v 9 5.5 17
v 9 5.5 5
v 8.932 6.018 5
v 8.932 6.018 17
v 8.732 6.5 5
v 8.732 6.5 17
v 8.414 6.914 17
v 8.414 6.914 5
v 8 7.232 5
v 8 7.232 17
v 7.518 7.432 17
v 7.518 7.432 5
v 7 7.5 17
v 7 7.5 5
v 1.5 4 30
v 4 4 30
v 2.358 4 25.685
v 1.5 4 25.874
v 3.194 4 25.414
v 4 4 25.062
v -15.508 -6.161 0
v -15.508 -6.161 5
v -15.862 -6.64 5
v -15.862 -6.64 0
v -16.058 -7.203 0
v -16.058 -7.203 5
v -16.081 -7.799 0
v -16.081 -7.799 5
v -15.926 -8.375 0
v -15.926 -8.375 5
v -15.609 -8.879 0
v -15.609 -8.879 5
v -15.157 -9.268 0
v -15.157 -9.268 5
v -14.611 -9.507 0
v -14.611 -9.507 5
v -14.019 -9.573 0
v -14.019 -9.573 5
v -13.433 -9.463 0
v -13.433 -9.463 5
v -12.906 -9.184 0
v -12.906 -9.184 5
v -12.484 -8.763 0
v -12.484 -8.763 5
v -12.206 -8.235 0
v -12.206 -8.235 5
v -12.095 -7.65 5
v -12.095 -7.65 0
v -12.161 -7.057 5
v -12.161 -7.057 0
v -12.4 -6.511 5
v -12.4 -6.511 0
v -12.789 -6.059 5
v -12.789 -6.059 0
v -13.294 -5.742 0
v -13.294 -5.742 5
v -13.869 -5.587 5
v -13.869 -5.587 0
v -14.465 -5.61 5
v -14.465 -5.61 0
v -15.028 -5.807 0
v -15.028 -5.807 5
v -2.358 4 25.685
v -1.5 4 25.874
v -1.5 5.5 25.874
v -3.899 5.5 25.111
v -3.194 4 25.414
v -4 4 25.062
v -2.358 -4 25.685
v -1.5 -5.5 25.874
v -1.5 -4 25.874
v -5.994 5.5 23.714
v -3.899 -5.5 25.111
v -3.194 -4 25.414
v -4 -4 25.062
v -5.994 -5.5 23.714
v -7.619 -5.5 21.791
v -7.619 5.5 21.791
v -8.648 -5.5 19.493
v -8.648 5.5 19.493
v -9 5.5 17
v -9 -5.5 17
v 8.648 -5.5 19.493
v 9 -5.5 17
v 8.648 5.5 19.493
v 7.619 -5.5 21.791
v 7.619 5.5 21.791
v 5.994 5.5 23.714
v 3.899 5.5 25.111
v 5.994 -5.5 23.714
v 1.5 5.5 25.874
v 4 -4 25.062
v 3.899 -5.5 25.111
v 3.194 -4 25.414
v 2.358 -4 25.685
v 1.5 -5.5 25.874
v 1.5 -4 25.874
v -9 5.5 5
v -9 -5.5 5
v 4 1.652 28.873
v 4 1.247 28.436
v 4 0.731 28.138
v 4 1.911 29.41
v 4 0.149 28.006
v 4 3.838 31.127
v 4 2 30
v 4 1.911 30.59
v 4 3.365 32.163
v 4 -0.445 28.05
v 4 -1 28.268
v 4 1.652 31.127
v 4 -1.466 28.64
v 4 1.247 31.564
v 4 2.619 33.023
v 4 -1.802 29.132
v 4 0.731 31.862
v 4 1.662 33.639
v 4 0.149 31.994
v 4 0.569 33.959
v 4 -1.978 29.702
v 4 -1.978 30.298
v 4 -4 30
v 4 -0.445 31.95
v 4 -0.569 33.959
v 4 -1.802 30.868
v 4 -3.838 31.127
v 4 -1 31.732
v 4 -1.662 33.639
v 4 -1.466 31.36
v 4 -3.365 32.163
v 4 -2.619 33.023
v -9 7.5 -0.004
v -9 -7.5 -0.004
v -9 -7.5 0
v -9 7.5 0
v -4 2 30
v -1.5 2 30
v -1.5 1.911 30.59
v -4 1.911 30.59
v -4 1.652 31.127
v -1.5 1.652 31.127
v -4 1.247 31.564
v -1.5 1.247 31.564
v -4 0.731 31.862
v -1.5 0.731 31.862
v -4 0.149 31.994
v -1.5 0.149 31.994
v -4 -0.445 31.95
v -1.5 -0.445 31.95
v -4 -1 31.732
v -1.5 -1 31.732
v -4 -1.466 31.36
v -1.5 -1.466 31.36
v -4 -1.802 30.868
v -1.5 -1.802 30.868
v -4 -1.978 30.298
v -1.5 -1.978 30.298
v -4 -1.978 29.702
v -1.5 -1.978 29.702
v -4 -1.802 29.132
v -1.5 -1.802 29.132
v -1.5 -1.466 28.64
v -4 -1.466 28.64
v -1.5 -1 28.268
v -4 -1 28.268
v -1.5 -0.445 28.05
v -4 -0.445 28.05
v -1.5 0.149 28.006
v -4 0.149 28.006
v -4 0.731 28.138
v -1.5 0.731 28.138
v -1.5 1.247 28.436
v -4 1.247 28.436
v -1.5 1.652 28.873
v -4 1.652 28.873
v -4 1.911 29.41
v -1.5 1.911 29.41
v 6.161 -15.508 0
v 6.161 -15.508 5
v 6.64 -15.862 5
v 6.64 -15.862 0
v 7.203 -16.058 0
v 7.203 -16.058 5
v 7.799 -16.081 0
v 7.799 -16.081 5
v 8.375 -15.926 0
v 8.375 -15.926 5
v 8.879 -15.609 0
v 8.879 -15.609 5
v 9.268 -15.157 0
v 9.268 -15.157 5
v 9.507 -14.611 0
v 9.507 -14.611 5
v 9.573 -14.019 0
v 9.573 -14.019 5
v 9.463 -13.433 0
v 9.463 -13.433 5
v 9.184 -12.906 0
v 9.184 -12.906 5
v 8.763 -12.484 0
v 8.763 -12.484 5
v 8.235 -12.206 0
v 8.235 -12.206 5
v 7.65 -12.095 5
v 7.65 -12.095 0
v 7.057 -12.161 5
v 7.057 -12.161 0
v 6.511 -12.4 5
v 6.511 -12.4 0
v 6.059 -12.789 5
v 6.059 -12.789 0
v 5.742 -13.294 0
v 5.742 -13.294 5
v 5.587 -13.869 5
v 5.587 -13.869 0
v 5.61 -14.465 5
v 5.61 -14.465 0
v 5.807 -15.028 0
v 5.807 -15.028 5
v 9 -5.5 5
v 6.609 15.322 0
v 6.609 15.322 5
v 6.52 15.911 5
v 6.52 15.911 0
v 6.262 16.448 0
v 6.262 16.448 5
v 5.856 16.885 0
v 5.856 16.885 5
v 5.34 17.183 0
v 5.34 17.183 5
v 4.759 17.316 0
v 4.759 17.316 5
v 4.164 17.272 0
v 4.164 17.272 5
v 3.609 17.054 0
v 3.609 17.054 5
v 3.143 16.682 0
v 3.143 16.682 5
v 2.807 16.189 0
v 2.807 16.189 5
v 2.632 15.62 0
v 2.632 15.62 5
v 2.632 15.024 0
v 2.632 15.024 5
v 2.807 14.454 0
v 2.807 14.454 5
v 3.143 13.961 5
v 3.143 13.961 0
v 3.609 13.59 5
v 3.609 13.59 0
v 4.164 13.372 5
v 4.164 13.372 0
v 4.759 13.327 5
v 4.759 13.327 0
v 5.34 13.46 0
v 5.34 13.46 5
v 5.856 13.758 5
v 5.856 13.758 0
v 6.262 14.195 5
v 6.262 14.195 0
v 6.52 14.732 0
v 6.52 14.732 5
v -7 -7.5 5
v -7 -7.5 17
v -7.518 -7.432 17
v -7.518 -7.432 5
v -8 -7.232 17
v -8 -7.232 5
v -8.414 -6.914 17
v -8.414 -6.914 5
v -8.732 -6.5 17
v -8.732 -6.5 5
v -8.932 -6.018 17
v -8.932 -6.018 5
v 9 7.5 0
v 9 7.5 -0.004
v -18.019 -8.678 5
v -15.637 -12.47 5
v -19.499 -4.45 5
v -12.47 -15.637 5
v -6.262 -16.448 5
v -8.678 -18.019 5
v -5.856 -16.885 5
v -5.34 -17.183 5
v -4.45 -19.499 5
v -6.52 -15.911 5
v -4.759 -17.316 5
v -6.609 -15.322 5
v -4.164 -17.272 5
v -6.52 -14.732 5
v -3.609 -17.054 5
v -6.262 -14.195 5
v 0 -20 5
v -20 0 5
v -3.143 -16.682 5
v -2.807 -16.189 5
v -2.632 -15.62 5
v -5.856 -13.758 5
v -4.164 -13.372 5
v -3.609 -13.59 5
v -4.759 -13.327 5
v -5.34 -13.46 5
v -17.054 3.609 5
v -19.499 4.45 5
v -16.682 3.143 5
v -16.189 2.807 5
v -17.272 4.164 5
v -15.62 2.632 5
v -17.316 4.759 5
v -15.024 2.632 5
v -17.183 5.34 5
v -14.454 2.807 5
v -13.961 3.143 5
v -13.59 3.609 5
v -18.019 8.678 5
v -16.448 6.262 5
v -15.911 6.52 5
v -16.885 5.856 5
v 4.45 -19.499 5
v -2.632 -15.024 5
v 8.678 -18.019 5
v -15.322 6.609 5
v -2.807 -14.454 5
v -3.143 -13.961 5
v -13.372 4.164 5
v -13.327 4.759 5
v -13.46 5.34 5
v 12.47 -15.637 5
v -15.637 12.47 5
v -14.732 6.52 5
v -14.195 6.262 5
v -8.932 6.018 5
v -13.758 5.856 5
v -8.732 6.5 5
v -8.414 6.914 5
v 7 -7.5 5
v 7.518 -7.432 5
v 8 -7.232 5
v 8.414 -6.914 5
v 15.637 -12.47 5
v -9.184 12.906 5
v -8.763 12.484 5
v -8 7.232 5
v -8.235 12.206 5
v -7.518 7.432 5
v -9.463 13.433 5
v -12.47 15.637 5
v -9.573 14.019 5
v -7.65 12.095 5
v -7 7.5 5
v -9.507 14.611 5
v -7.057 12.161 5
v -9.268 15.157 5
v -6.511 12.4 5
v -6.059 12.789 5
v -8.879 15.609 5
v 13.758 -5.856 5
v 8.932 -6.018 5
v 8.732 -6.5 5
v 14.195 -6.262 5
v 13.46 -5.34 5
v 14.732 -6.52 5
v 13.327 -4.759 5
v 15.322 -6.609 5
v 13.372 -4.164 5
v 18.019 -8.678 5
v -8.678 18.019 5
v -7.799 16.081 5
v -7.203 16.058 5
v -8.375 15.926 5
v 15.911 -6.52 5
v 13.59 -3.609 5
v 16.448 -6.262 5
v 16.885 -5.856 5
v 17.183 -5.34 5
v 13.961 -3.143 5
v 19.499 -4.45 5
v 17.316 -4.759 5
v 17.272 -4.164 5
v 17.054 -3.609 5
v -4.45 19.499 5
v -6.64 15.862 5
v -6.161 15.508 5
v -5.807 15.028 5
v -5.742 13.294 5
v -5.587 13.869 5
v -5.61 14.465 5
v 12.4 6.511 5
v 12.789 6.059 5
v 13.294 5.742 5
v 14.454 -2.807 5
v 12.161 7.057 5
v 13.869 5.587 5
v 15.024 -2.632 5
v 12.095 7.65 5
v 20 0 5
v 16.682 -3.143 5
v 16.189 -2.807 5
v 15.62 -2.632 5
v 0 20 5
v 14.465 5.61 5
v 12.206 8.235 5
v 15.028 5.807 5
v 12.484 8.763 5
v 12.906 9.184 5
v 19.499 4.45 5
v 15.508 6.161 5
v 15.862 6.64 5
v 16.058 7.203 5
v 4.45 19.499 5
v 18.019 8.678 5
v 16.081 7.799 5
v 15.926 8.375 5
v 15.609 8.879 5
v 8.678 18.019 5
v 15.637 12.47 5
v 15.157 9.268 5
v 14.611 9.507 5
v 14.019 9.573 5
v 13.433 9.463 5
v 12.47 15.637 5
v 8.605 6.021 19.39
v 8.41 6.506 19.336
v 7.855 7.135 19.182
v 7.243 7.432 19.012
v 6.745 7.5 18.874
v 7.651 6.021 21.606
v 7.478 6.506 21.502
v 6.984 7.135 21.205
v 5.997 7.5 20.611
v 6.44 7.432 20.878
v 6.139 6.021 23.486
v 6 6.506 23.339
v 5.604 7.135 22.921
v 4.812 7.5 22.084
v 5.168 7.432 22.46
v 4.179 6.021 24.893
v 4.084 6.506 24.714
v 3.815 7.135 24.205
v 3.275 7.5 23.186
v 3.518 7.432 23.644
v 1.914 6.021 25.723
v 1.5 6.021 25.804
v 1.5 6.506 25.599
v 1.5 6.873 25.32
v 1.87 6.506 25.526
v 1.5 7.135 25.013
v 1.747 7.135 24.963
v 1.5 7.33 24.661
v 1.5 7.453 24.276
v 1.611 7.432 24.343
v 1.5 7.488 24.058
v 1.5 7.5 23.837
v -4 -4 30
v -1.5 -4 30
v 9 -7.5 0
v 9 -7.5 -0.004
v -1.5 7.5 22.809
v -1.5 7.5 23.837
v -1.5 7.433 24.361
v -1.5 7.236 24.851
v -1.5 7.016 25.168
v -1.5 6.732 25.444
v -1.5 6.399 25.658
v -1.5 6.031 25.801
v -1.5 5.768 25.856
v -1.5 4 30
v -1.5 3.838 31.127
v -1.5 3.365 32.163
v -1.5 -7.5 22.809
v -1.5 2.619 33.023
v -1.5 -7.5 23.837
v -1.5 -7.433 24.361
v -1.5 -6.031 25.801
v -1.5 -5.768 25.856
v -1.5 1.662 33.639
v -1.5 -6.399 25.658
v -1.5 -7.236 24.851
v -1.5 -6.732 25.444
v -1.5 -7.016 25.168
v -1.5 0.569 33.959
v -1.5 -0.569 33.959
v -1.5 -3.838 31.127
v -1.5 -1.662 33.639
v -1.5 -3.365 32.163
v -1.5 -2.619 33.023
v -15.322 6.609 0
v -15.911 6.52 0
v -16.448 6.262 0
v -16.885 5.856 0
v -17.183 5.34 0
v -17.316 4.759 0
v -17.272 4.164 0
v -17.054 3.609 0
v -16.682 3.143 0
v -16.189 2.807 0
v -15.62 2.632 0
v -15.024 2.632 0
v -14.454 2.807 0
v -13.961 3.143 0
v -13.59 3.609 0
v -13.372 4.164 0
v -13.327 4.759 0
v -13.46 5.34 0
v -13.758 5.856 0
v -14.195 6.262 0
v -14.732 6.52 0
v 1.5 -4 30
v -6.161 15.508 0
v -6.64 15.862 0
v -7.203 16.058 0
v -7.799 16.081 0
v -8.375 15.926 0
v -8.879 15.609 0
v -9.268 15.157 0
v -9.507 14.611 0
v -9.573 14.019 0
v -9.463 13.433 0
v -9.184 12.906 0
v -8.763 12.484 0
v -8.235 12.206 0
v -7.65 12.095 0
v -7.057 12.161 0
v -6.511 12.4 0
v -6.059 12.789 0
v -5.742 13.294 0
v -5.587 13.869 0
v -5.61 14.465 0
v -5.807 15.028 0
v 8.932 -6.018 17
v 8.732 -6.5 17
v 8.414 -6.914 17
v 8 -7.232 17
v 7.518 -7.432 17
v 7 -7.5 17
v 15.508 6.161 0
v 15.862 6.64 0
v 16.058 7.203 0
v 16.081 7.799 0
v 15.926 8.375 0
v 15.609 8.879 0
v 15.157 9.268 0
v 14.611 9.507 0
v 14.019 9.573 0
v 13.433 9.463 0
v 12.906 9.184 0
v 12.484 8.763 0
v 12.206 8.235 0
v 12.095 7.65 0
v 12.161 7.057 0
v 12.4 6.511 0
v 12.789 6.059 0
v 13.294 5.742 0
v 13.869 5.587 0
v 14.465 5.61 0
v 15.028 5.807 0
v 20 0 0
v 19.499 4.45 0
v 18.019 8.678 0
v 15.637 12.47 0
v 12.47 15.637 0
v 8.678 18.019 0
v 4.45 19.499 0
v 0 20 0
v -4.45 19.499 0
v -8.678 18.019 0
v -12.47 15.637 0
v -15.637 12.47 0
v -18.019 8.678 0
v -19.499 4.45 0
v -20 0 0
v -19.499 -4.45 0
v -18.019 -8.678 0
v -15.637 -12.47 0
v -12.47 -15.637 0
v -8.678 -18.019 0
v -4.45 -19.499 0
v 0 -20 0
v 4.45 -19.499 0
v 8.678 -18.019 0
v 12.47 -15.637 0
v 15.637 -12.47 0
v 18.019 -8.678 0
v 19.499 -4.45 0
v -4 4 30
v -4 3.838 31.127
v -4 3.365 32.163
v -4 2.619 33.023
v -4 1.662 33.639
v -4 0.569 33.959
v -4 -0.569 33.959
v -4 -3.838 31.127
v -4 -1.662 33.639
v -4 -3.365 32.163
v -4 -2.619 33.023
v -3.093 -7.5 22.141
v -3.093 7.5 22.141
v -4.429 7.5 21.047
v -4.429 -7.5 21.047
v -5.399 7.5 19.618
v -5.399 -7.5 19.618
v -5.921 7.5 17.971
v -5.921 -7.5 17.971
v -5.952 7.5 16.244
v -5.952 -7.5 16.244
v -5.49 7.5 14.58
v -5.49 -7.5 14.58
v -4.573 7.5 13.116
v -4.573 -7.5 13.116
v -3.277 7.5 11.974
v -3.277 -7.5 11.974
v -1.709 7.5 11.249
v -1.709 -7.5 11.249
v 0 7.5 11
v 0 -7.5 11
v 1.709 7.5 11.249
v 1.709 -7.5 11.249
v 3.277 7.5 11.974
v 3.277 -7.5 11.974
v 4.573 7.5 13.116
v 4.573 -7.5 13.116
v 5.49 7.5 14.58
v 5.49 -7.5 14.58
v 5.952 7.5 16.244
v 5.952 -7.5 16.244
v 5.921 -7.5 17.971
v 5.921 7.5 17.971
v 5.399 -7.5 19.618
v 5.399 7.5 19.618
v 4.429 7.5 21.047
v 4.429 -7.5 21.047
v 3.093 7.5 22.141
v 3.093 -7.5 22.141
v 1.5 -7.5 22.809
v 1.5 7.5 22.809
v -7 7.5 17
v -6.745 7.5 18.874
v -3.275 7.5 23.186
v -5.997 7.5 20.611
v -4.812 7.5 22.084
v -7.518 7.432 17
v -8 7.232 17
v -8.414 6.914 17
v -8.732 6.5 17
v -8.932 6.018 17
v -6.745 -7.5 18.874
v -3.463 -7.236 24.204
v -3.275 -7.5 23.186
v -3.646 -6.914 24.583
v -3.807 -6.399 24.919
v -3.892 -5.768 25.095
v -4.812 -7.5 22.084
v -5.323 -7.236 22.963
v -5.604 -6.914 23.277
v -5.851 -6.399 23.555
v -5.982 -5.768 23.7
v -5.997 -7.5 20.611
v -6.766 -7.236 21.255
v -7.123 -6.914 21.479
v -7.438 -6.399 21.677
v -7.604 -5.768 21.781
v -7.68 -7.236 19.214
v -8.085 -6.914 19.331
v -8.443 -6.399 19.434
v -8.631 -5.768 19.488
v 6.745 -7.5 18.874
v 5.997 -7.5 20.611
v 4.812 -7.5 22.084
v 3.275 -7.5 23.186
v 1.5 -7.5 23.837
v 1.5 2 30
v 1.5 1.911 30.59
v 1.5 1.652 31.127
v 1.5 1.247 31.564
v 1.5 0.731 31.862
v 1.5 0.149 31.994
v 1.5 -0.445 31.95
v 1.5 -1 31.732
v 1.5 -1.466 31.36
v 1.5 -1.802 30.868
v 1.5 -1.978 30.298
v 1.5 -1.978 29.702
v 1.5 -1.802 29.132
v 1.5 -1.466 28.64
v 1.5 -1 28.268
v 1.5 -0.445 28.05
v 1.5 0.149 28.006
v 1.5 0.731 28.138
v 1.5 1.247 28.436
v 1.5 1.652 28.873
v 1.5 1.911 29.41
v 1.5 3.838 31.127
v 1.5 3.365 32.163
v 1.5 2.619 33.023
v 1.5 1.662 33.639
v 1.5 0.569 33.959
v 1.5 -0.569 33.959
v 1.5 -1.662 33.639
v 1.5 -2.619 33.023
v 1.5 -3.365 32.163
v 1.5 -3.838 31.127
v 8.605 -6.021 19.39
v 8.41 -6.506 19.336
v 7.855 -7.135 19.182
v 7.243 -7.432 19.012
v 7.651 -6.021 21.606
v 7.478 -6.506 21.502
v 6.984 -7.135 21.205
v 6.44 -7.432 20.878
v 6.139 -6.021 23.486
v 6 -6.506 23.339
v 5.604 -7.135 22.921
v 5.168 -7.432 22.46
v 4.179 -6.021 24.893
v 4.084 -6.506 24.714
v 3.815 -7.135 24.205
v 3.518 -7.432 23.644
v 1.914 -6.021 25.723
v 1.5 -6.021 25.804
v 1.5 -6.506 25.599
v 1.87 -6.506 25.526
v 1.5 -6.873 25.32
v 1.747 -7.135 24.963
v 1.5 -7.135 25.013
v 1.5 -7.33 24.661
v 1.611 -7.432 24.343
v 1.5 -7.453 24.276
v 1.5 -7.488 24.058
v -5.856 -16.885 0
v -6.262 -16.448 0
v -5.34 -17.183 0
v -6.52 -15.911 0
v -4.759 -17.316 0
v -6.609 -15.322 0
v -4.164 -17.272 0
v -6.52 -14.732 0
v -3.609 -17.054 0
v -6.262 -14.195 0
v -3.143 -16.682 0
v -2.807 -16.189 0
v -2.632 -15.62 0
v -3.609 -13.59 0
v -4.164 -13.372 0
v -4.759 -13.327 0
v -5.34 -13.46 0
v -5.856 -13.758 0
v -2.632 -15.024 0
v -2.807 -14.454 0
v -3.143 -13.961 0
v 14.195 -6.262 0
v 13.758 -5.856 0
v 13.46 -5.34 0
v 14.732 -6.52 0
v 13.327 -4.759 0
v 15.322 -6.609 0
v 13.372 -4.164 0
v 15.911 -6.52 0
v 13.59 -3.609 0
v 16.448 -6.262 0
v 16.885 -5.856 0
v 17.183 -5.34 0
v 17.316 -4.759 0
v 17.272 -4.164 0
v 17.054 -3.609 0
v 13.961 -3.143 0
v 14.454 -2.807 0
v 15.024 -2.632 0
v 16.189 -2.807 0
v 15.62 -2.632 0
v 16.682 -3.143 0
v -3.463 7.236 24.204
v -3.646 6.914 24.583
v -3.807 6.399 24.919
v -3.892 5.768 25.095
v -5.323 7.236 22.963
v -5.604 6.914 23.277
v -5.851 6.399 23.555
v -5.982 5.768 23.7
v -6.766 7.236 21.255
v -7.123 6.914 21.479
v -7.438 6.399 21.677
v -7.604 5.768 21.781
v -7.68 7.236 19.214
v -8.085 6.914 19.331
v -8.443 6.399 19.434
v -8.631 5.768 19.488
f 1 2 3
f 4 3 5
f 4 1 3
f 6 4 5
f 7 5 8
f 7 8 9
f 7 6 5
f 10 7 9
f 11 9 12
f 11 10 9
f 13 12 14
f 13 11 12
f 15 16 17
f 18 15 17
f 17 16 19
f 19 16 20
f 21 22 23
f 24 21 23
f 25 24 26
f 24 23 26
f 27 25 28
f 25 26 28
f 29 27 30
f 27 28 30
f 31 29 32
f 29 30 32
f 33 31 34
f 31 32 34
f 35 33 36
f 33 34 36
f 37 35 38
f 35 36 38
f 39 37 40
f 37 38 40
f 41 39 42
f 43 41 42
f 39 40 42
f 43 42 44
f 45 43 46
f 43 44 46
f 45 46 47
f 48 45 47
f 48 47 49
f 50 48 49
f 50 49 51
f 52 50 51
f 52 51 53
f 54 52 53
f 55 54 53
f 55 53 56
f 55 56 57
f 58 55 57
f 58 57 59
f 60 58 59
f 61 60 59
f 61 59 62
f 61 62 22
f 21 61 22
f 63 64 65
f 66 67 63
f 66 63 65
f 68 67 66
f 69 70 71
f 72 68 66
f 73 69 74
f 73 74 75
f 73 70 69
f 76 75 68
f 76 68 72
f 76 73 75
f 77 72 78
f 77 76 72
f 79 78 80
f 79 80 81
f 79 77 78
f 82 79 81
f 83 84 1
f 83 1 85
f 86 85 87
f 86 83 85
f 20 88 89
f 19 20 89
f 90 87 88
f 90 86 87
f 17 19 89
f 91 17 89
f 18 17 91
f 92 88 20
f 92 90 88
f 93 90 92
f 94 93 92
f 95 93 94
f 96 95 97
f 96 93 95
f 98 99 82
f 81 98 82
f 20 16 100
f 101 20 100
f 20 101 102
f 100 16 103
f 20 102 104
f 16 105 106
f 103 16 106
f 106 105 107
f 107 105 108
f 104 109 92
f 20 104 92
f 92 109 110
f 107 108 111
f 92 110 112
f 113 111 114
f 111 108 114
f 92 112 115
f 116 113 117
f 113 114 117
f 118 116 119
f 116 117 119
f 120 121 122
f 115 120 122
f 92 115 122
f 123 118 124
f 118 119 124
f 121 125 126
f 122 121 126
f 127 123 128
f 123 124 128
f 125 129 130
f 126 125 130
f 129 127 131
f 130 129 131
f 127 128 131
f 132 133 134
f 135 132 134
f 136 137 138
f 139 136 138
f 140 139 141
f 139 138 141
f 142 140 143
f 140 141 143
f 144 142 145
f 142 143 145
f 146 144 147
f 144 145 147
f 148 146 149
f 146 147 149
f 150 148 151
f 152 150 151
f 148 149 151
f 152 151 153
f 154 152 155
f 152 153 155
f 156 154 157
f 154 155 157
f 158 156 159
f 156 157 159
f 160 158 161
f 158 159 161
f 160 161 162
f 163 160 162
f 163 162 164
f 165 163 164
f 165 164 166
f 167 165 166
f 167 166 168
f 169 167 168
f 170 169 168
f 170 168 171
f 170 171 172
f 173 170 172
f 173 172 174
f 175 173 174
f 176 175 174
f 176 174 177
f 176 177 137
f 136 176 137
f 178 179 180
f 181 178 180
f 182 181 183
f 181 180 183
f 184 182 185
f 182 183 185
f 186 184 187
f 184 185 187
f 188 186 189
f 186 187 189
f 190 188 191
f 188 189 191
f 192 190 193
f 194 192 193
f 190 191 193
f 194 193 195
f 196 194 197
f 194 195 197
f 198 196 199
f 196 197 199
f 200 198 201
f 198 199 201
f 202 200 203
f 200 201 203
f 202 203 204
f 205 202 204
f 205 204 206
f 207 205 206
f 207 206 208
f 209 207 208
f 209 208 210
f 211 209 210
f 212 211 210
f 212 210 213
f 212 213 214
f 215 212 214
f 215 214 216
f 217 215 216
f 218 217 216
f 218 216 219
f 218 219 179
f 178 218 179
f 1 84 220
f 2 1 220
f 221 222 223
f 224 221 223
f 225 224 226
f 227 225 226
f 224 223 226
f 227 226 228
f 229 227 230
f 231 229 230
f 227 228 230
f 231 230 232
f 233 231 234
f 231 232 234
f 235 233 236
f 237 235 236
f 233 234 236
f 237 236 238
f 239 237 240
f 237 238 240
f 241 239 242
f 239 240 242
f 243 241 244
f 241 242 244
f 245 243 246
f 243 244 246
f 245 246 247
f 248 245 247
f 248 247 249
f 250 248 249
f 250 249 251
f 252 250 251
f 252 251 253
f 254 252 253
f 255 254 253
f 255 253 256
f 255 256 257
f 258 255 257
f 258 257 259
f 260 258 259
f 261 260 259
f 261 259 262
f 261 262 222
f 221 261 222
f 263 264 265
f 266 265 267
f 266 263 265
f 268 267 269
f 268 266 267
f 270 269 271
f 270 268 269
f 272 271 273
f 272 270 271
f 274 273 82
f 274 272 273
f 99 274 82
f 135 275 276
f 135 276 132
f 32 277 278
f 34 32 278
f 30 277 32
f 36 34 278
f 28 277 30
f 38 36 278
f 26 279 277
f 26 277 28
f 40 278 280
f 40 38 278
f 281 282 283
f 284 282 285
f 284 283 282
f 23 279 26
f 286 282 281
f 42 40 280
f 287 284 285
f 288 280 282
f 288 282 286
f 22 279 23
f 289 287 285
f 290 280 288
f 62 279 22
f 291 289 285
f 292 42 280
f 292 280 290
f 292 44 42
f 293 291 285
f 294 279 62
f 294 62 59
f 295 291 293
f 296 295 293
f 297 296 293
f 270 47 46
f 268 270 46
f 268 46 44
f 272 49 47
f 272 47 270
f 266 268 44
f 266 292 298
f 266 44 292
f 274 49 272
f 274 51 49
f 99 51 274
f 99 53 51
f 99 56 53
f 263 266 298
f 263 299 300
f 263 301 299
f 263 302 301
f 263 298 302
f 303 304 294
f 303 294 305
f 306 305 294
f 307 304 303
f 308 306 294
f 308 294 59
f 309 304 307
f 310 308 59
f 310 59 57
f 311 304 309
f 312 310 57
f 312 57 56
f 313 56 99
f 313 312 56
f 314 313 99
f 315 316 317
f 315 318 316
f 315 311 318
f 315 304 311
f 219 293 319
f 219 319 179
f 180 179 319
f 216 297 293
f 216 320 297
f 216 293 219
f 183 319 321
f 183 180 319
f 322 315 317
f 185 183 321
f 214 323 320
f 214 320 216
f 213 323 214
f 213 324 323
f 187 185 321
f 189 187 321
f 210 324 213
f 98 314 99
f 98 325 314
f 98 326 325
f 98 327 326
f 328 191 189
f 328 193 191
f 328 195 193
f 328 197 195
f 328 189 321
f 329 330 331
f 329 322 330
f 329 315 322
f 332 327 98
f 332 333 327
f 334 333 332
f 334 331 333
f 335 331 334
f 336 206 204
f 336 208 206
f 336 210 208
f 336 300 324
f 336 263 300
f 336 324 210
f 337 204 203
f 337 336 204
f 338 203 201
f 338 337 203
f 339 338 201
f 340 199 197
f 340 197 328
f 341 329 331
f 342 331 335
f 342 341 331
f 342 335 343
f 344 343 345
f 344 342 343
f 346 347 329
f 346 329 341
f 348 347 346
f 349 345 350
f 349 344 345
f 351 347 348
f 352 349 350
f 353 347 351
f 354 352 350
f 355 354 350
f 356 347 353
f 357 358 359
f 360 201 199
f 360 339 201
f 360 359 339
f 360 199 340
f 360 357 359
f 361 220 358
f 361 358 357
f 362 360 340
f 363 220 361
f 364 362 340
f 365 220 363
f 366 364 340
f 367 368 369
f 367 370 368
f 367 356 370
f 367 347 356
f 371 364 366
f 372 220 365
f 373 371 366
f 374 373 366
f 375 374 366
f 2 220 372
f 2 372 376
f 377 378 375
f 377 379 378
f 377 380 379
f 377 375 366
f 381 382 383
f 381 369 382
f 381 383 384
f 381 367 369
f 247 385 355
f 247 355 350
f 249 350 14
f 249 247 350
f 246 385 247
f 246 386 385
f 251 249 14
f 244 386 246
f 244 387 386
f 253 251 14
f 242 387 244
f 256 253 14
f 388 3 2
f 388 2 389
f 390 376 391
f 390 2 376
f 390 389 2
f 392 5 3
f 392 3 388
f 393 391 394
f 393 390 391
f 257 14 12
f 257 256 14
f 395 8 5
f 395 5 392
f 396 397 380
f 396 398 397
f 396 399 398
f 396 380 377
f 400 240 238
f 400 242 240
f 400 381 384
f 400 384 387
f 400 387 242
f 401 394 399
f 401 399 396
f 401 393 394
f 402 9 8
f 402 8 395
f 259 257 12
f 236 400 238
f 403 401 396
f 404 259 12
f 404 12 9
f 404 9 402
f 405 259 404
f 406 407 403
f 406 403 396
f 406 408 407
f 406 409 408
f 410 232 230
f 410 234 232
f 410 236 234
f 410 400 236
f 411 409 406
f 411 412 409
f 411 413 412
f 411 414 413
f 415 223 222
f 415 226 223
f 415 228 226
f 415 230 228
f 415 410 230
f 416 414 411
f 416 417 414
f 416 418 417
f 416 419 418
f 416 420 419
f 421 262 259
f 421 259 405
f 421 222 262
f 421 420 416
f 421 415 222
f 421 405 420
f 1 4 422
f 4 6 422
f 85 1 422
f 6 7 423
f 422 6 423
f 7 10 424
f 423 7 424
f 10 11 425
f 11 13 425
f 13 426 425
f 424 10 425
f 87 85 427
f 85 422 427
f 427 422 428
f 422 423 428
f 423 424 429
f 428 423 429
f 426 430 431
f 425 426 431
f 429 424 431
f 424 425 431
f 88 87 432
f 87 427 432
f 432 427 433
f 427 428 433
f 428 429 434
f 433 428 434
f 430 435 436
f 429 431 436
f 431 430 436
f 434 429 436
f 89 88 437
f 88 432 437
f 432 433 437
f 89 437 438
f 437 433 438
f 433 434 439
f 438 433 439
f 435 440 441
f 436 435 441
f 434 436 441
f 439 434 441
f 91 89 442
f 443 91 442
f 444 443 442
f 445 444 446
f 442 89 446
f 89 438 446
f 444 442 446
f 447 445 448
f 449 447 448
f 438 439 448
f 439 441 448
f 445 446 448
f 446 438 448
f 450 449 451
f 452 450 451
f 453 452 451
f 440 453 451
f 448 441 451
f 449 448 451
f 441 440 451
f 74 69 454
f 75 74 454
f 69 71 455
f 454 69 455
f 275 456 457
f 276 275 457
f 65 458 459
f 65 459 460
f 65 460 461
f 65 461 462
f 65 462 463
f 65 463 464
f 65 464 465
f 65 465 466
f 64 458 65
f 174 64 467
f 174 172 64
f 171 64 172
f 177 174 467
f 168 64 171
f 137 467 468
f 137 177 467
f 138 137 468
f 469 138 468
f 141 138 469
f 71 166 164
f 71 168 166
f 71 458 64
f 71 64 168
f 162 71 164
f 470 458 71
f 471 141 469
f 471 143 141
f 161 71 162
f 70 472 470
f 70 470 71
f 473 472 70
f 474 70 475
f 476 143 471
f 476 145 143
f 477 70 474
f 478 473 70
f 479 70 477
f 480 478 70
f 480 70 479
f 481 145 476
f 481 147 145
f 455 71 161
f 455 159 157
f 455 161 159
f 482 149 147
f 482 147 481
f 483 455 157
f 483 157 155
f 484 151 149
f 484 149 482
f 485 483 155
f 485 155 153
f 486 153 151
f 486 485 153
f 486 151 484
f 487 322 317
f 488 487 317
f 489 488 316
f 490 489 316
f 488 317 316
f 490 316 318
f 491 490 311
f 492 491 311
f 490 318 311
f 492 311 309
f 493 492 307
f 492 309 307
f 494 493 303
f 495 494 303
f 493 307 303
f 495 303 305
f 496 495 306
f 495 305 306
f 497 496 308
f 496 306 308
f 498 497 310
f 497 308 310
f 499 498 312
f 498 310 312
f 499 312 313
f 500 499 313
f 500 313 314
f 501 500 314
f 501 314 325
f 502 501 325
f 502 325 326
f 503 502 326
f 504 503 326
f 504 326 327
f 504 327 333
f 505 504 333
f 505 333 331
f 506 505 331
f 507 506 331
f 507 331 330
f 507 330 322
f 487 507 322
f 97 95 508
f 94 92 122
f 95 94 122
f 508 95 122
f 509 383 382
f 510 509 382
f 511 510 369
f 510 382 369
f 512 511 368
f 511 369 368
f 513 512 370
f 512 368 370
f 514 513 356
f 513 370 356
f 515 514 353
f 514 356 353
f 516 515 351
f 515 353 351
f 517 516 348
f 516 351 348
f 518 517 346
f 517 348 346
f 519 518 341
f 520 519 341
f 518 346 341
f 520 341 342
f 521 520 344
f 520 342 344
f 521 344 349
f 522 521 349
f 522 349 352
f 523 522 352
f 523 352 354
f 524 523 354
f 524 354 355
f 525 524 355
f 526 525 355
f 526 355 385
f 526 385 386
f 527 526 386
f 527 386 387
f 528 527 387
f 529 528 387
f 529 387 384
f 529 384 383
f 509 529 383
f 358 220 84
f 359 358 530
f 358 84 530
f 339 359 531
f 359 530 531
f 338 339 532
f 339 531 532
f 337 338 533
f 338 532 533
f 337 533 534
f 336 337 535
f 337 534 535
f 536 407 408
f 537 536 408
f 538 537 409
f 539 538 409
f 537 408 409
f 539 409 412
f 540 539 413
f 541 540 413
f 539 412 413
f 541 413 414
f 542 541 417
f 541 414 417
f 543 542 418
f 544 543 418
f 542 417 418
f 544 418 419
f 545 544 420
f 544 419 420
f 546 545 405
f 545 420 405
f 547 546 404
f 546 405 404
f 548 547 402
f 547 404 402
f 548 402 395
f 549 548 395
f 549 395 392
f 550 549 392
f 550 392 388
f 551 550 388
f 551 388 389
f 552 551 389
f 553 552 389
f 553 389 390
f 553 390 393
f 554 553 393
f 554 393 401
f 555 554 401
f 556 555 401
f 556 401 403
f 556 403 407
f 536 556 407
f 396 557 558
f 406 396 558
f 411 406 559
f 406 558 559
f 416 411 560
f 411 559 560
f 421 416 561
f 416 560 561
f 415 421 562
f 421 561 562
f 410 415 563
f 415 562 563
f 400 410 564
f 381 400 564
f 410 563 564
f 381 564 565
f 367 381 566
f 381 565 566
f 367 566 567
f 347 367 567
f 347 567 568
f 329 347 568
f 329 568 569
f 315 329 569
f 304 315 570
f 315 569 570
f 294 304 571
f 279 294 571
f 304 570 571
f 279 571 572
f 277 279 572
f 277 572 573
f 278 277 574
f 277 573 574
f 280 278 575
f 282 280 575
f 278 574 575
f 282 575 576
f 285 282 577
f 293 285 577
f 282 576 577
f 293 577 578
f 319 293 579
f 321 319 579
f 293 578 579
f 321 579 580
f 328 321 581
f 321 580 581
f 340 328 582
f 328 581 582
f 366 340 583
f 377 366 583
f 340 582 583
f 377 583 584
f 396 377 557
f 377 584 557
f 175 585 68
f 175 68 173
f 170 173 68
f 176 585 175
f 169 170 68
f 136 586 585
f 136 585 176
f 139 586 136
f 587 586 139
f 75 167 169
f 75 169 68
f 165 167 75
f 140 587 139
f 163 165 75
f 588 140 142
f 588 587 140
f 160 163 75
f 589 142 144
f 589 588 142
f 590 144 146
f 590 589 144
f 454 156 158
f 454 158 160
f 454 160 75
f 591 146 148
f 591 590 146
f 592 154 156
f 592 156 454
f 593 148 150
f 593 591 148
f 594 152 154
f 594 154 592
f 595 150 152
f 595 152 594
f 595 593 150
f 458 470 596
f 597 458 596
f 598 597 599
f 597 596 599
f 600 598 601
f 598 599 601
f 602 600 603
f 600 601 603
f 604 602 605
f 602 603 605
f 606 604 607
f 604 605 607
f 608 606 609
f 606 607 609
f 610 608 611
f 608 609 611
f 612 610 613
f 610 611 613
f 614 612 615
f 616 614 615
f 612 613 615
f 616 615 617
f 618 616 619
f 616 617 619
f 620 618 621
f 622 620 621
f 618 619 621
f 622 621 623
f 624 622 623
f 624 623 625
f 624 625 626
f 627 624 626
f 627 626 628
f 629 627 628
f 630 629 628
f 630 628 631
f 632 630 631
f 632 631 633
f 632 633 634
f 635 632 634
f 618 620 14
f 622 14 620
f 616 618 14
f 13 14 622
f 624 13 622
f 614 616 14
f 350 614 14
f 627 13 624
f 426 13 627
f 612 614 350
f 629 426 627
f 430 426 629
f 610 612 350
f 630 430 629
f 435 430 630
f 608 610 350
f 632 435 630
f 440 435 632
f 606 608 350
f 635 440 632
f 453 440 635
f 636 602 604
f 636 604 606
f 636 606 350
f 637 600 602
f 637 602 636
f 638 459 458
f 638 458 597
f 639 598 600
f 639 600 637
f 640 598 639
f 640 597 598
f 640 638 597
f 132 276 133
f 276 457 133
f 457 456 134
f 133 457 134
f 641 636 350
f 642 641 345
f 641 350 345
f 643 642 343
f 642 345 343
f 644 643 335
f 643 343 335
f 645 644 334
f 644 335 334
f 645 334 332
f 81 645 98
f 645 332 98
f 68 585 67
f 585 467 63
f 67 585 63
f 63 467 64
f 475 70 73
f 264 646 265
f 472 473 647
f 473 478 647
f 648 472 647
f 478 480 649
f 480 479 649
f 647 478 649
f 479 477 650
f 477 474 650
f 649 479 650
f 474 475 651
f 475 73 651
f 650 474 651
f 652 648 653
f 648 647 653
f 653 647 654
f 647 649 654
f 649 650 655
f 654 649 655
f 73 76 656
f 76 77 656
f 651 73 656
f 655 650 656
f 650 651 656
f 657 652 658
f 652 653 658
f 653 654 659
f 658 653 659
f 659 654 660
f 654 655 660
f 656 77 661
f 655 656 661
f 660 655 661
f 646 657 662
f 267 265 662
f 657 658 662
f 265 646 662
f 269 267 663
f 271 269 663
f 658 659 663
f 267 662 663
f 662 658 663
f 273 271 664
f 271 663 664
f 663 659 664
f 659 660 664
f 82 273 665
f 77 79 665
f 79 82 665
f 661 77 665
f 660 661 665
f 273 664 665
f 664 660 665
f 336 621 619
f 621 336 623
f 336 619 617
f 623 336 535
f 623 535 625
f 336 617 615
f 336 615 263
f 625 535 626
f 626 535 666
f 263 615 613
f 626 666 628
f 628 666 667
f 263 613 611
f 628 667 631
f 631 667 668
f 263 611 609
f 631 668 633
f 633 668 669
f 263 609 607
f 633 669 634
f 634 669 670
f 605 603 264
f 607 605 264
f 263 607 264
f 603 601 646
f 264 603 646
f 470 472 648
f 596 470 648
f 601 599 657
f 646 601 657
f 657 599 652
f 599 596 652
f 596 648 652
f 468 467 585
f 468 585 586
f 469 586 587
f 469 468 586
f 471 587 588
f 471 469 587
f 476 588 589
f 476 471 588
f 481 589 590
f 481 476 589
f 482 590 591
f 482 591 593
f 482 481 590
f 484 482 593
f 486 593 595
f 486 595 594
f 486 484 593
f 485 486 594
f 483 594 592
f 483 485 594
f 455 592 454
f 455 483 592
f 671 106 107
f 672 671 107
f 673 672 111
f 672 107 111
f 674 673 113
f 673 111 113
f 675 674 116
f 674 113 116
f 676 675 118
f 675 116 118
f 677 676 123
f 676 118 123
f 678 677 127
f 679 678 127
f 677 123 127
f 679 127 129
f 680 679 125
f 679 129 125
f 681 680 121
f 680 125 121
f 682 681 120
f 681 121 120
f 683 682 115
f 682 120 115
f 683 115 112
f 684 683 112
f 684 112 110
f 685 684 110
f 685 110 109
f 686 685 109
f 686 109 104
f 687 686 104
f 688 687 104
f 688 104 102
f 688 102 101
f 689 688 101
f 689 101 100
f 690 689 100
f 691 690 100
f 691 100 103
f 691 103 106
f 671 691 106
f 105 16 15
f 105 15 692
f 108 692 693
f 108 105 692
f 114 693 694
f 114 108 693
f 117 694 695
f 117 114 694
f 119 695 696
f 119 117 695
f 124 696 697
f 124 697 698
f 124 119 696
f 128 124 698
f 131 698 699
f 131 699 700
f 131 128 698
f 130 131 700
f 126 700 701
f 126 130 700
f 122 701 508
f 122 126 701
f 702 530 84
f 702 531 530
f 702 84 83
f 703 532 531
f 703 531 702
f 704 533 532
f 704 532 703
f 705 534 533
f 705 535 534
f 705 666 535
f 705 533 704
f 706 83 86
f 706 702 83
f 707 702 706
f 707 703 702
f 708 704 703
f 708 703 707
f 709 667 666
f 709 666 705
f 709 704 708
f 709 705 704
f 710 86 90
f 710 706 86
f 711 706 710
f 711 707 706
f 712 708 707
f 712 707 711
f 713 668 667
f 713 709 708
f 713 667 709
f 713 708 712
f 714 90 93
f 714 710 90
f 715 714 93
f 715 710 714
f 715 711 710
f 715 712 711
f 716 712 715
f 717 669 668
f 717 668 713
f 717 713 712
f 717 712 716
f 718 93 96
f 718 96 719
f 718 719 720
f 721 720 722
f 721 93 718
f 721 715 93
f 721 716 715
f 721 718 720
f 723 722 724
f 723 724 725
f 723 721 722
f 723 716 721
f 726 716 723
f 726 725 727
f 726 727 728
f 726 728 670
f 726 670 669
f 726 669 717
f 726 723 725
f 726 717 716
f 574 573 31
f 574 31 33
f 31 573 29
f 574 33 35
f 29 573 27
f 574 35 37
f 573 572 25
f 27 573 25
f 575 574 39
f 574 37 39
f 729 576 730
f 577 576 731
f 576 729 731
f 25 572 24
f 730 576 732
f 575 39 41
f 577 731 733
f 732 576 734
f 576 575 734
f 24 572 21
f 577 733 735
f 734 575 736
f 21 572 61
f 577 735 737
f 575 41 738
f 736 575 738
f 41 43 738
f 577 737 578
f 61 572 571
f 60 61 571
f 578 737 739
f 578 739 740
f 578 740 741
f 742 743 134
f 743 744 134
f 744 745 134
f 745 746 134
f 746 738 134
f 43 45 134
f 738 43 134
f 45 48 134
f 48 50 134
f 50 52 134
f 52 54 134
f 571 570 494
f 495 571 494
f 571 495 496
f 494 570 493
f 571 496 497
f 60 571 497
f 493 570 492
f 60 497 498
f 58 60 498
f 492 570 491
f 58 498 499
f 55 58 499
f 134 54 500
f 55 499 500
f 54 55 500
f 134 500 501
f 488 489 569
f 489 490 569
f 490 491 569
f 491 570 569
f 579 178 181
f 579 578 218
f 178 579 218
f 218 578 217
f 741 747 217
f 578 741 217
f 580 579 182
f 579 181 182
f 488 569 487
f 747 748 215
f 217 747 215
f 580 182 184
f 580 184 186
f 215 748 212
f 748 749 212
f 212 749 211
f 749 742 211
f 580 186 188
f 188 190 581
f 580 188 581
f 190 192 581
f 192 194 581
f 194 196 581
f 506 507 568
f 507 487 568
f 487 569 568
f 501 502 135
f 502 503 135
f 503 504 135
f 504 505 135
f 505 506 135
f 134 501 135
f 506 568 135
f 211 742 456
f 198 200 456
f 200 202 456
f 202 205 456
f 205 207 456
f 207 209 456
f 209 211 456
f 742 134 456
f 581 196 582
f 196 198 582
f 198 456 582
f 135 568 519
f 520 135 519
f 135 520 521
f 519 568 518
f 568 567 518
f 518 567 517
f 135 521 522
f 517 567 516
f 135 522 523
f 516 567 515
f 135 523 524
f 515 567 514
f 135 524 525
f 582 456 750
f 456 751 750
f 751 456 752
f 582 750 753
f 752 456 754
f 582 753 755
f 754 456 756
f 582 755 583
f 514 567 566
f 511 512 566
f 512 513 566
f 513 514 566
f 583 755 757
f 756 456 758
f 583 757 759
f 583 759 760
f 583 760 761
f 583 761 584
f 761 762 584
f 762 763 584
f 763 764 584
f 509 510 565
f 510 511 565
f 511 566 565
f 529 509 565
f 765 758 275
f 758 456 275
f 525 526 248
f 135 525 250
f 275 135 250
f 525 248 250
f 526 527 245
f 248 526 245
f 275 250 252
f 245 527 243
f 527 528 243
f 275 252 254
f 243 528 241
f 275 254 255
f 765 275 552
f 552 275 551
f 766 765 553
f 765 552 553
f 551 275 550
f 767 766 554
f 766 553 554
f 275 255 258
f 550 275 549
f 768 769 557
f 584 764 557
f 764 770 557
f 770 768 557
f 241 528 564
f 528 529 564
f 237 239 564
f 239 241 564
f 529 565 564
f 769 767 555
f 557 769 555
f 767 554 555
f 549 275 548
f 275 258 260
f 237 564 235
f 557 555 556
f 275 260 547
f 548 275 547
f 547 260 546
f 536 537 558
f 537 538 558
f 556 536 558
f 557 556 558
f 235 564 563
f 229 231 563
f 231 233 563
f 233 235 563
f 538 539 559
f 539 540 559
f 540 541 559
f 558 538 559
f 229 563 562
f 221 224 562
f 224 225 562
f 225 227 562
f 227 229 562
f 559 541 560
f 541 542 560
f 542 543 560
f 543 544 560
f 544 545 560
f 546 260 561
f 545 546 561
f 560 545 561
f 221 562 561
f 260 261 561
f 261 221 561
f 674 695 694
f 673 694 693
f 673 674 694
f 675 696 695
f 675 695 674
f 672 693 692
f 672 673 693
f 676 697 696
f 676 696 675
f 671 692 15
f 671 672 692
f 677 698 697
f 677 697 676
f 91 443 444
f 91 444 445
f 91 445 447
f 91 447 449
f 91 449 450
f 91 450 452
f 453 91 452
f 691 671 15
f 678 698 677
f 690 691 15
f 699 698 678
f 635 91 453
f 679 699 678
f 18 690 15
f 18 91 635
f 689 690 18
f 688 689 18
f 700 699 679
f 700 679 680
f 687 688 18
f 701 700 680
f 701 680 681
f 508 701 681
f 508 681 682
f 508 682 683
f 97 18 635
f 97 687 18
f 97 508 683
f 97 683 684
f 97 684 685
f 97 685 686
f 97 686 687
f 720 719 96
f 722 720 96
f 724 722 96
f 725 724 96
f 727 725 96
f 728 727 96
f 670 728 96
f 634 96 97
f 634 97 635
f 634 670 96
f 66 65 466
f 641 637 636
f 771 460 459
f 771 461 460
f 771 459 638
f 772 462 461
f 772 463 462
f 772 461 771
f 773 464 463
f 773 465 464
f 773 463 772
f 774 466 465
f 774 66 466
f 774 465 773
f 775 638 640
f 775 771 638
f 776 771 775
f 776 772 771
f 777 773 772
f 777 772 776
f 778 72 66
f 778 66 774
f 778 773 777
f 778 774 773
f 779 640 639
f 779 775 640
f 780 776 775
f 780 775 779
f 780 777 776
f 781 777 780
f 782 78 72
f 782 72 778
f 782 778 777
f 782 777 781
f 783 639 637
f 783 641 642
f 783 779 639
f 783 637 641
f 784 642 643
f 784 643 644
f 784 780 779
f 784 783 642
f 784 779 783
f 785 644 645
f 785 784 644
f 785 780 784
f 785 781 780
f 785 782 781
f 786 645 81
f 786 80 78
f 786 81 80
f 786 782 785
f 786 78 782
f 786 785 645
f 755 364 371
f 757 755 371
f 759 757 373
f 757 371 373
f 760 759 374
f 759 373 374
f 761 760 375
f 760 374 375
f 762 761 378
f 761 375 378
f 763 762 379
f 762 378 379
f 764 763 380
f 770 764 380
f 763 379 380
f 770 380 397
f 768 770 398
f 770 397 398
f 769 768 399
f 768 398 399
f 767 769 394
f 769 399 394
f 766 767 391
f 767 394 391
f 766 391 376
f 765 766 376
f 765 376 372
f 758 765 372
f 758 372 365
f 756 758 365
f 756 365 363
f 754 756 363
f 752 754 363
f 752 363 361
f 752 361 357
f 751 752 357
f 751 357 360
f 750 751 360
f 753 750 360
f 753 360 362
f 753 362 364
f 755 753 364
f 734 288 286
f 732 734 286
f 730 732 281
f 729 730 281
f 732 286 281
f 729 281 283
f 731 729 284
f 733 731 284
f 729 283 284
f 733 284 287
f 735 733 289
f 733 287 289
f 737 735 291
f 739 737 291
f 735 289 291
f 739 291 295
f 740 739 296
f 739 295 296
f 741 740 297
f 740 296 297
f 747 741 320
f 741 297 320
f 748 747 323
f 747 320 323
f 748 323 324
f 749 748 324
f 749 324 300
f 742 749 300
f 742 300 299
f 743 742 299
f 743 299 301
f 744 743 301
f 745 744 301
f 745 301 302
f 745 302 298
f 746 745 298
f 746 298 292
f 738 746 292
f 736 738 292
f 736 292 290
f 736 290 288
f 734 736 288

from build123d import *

# Parameters (mm, degrees)
SKETCH_R           = 20
PAD_DEPTH          = 5
PAD001_DEPTH       = 7.5
PAD002_DEPTH       = 4
SKETCH003_R        = 2
POCKET_DEPTH       = 24.001
POCKET001_DEPTH    = 27.501
SKETCH005_R        = 2
POCKET002_DEPTH    = 137.008872
POLARPATTERN_COUNT = 8
FILLET_R           = 2


with BuildPart() as part:
    # Sketch → Pad (new body)
    with BuildSketch(Plane.XY):
        Circle(SKETCH_R)
    extrude(amount=PAD_DEPTH)

    # Sketch001 → Pad001 (join, symmetric)
    with BuildSketch(Plane.XZ):
        with BuildLine():
            Line((9, 17), (9, -0.003877))
            Line((9, -0.003877), (-9, -0.003877))
            Line((-9, -0.003877), (-9, 17))
            ThreePointArc((9, 17), (0, 26), (-9, 17))
        make_face()
    extrude(amount=PAD001_DEPTH, both=True)

    # Sketch002 → Pad002 (join, symmetric)
    with BuildSketch(Plane.YZ):
        with BuildLine():
            Line((-4, 13.8), (-4, 30))
            ThreePointArc((4, 30), (0, 34), (-4, 30))
            Line((4, 30), (4, 13.8))
            Line((4, 13.8), (-4, 13.8))
        make_face()
    extrude(amount=PAD002_DEPTH, both=True)

    # Sketch003 (on Face16 of Pad002) → Pocket (cut, through all)
    with BuildSketch(Plane.YZ.offset(4)):
        with Locations((0, 30)):
            Circle(SKETCH003_R)
    extrude(amount=-POCKET_DEPTH, mode=Mode.SUBTRACT)

    # Sketch004 (on Face11 of Pocket) → Pocket001 (cut, through all)
    with BuildSketch(Plane.XZ.offset(7.5)):
        with BuildLine():
            ThreePointArc((-1.5, 22.809475), (0, 11), (1.5, 22.809475))
            Line((1.5, 39.24), (1.5, 22.809475))
            Line((-1.5, 39.24), (1.5, 39.24))
            Line((-1.5, 22.809475), (-1.5, 39.24))
        make_face()
    extrude(amount=-POCKET001_DEPTH, mode=Mode.SUBTRACT)

    # Sketch005 (on Face3 of Pocket001) → Pocket002 (cut, through all)
    with BuildSketch(Plane.XY.offset(5)):
        with Locations((4.609226, 15.321718)):
            Circle(SKETCH005_R)
    pocket002 = extrude(amount=-POCKET002_DEPTH, mode=Mode.SUBTRACT)

    # PolarPattern: Pocket002 ×8 about axis
    polarpattern_axis = Axis((0, 0, 5), (0, 0, 1))
    for i in range(1, POLARPATTERN_COUNT):
        add(pocket002.rotate(polarpattern_axis, i * 360 / POLARPATTERN_COUNT), mode=Mode.SUBTRACT)

    # Fillet
    fillet_edges = [part.edges().sort_by_distance(p)[0] for p in [
        (6.873864, -7.5, 22.809475),
        (-6.873864, -7.5, 22.809475),
        (6.873864, 7.5, 22.809475),
        (-6.873864, 7.5, 22.809475),
    ]]
    fillet(fillet_edges, radius=FILLET_R)


solid = part.part
